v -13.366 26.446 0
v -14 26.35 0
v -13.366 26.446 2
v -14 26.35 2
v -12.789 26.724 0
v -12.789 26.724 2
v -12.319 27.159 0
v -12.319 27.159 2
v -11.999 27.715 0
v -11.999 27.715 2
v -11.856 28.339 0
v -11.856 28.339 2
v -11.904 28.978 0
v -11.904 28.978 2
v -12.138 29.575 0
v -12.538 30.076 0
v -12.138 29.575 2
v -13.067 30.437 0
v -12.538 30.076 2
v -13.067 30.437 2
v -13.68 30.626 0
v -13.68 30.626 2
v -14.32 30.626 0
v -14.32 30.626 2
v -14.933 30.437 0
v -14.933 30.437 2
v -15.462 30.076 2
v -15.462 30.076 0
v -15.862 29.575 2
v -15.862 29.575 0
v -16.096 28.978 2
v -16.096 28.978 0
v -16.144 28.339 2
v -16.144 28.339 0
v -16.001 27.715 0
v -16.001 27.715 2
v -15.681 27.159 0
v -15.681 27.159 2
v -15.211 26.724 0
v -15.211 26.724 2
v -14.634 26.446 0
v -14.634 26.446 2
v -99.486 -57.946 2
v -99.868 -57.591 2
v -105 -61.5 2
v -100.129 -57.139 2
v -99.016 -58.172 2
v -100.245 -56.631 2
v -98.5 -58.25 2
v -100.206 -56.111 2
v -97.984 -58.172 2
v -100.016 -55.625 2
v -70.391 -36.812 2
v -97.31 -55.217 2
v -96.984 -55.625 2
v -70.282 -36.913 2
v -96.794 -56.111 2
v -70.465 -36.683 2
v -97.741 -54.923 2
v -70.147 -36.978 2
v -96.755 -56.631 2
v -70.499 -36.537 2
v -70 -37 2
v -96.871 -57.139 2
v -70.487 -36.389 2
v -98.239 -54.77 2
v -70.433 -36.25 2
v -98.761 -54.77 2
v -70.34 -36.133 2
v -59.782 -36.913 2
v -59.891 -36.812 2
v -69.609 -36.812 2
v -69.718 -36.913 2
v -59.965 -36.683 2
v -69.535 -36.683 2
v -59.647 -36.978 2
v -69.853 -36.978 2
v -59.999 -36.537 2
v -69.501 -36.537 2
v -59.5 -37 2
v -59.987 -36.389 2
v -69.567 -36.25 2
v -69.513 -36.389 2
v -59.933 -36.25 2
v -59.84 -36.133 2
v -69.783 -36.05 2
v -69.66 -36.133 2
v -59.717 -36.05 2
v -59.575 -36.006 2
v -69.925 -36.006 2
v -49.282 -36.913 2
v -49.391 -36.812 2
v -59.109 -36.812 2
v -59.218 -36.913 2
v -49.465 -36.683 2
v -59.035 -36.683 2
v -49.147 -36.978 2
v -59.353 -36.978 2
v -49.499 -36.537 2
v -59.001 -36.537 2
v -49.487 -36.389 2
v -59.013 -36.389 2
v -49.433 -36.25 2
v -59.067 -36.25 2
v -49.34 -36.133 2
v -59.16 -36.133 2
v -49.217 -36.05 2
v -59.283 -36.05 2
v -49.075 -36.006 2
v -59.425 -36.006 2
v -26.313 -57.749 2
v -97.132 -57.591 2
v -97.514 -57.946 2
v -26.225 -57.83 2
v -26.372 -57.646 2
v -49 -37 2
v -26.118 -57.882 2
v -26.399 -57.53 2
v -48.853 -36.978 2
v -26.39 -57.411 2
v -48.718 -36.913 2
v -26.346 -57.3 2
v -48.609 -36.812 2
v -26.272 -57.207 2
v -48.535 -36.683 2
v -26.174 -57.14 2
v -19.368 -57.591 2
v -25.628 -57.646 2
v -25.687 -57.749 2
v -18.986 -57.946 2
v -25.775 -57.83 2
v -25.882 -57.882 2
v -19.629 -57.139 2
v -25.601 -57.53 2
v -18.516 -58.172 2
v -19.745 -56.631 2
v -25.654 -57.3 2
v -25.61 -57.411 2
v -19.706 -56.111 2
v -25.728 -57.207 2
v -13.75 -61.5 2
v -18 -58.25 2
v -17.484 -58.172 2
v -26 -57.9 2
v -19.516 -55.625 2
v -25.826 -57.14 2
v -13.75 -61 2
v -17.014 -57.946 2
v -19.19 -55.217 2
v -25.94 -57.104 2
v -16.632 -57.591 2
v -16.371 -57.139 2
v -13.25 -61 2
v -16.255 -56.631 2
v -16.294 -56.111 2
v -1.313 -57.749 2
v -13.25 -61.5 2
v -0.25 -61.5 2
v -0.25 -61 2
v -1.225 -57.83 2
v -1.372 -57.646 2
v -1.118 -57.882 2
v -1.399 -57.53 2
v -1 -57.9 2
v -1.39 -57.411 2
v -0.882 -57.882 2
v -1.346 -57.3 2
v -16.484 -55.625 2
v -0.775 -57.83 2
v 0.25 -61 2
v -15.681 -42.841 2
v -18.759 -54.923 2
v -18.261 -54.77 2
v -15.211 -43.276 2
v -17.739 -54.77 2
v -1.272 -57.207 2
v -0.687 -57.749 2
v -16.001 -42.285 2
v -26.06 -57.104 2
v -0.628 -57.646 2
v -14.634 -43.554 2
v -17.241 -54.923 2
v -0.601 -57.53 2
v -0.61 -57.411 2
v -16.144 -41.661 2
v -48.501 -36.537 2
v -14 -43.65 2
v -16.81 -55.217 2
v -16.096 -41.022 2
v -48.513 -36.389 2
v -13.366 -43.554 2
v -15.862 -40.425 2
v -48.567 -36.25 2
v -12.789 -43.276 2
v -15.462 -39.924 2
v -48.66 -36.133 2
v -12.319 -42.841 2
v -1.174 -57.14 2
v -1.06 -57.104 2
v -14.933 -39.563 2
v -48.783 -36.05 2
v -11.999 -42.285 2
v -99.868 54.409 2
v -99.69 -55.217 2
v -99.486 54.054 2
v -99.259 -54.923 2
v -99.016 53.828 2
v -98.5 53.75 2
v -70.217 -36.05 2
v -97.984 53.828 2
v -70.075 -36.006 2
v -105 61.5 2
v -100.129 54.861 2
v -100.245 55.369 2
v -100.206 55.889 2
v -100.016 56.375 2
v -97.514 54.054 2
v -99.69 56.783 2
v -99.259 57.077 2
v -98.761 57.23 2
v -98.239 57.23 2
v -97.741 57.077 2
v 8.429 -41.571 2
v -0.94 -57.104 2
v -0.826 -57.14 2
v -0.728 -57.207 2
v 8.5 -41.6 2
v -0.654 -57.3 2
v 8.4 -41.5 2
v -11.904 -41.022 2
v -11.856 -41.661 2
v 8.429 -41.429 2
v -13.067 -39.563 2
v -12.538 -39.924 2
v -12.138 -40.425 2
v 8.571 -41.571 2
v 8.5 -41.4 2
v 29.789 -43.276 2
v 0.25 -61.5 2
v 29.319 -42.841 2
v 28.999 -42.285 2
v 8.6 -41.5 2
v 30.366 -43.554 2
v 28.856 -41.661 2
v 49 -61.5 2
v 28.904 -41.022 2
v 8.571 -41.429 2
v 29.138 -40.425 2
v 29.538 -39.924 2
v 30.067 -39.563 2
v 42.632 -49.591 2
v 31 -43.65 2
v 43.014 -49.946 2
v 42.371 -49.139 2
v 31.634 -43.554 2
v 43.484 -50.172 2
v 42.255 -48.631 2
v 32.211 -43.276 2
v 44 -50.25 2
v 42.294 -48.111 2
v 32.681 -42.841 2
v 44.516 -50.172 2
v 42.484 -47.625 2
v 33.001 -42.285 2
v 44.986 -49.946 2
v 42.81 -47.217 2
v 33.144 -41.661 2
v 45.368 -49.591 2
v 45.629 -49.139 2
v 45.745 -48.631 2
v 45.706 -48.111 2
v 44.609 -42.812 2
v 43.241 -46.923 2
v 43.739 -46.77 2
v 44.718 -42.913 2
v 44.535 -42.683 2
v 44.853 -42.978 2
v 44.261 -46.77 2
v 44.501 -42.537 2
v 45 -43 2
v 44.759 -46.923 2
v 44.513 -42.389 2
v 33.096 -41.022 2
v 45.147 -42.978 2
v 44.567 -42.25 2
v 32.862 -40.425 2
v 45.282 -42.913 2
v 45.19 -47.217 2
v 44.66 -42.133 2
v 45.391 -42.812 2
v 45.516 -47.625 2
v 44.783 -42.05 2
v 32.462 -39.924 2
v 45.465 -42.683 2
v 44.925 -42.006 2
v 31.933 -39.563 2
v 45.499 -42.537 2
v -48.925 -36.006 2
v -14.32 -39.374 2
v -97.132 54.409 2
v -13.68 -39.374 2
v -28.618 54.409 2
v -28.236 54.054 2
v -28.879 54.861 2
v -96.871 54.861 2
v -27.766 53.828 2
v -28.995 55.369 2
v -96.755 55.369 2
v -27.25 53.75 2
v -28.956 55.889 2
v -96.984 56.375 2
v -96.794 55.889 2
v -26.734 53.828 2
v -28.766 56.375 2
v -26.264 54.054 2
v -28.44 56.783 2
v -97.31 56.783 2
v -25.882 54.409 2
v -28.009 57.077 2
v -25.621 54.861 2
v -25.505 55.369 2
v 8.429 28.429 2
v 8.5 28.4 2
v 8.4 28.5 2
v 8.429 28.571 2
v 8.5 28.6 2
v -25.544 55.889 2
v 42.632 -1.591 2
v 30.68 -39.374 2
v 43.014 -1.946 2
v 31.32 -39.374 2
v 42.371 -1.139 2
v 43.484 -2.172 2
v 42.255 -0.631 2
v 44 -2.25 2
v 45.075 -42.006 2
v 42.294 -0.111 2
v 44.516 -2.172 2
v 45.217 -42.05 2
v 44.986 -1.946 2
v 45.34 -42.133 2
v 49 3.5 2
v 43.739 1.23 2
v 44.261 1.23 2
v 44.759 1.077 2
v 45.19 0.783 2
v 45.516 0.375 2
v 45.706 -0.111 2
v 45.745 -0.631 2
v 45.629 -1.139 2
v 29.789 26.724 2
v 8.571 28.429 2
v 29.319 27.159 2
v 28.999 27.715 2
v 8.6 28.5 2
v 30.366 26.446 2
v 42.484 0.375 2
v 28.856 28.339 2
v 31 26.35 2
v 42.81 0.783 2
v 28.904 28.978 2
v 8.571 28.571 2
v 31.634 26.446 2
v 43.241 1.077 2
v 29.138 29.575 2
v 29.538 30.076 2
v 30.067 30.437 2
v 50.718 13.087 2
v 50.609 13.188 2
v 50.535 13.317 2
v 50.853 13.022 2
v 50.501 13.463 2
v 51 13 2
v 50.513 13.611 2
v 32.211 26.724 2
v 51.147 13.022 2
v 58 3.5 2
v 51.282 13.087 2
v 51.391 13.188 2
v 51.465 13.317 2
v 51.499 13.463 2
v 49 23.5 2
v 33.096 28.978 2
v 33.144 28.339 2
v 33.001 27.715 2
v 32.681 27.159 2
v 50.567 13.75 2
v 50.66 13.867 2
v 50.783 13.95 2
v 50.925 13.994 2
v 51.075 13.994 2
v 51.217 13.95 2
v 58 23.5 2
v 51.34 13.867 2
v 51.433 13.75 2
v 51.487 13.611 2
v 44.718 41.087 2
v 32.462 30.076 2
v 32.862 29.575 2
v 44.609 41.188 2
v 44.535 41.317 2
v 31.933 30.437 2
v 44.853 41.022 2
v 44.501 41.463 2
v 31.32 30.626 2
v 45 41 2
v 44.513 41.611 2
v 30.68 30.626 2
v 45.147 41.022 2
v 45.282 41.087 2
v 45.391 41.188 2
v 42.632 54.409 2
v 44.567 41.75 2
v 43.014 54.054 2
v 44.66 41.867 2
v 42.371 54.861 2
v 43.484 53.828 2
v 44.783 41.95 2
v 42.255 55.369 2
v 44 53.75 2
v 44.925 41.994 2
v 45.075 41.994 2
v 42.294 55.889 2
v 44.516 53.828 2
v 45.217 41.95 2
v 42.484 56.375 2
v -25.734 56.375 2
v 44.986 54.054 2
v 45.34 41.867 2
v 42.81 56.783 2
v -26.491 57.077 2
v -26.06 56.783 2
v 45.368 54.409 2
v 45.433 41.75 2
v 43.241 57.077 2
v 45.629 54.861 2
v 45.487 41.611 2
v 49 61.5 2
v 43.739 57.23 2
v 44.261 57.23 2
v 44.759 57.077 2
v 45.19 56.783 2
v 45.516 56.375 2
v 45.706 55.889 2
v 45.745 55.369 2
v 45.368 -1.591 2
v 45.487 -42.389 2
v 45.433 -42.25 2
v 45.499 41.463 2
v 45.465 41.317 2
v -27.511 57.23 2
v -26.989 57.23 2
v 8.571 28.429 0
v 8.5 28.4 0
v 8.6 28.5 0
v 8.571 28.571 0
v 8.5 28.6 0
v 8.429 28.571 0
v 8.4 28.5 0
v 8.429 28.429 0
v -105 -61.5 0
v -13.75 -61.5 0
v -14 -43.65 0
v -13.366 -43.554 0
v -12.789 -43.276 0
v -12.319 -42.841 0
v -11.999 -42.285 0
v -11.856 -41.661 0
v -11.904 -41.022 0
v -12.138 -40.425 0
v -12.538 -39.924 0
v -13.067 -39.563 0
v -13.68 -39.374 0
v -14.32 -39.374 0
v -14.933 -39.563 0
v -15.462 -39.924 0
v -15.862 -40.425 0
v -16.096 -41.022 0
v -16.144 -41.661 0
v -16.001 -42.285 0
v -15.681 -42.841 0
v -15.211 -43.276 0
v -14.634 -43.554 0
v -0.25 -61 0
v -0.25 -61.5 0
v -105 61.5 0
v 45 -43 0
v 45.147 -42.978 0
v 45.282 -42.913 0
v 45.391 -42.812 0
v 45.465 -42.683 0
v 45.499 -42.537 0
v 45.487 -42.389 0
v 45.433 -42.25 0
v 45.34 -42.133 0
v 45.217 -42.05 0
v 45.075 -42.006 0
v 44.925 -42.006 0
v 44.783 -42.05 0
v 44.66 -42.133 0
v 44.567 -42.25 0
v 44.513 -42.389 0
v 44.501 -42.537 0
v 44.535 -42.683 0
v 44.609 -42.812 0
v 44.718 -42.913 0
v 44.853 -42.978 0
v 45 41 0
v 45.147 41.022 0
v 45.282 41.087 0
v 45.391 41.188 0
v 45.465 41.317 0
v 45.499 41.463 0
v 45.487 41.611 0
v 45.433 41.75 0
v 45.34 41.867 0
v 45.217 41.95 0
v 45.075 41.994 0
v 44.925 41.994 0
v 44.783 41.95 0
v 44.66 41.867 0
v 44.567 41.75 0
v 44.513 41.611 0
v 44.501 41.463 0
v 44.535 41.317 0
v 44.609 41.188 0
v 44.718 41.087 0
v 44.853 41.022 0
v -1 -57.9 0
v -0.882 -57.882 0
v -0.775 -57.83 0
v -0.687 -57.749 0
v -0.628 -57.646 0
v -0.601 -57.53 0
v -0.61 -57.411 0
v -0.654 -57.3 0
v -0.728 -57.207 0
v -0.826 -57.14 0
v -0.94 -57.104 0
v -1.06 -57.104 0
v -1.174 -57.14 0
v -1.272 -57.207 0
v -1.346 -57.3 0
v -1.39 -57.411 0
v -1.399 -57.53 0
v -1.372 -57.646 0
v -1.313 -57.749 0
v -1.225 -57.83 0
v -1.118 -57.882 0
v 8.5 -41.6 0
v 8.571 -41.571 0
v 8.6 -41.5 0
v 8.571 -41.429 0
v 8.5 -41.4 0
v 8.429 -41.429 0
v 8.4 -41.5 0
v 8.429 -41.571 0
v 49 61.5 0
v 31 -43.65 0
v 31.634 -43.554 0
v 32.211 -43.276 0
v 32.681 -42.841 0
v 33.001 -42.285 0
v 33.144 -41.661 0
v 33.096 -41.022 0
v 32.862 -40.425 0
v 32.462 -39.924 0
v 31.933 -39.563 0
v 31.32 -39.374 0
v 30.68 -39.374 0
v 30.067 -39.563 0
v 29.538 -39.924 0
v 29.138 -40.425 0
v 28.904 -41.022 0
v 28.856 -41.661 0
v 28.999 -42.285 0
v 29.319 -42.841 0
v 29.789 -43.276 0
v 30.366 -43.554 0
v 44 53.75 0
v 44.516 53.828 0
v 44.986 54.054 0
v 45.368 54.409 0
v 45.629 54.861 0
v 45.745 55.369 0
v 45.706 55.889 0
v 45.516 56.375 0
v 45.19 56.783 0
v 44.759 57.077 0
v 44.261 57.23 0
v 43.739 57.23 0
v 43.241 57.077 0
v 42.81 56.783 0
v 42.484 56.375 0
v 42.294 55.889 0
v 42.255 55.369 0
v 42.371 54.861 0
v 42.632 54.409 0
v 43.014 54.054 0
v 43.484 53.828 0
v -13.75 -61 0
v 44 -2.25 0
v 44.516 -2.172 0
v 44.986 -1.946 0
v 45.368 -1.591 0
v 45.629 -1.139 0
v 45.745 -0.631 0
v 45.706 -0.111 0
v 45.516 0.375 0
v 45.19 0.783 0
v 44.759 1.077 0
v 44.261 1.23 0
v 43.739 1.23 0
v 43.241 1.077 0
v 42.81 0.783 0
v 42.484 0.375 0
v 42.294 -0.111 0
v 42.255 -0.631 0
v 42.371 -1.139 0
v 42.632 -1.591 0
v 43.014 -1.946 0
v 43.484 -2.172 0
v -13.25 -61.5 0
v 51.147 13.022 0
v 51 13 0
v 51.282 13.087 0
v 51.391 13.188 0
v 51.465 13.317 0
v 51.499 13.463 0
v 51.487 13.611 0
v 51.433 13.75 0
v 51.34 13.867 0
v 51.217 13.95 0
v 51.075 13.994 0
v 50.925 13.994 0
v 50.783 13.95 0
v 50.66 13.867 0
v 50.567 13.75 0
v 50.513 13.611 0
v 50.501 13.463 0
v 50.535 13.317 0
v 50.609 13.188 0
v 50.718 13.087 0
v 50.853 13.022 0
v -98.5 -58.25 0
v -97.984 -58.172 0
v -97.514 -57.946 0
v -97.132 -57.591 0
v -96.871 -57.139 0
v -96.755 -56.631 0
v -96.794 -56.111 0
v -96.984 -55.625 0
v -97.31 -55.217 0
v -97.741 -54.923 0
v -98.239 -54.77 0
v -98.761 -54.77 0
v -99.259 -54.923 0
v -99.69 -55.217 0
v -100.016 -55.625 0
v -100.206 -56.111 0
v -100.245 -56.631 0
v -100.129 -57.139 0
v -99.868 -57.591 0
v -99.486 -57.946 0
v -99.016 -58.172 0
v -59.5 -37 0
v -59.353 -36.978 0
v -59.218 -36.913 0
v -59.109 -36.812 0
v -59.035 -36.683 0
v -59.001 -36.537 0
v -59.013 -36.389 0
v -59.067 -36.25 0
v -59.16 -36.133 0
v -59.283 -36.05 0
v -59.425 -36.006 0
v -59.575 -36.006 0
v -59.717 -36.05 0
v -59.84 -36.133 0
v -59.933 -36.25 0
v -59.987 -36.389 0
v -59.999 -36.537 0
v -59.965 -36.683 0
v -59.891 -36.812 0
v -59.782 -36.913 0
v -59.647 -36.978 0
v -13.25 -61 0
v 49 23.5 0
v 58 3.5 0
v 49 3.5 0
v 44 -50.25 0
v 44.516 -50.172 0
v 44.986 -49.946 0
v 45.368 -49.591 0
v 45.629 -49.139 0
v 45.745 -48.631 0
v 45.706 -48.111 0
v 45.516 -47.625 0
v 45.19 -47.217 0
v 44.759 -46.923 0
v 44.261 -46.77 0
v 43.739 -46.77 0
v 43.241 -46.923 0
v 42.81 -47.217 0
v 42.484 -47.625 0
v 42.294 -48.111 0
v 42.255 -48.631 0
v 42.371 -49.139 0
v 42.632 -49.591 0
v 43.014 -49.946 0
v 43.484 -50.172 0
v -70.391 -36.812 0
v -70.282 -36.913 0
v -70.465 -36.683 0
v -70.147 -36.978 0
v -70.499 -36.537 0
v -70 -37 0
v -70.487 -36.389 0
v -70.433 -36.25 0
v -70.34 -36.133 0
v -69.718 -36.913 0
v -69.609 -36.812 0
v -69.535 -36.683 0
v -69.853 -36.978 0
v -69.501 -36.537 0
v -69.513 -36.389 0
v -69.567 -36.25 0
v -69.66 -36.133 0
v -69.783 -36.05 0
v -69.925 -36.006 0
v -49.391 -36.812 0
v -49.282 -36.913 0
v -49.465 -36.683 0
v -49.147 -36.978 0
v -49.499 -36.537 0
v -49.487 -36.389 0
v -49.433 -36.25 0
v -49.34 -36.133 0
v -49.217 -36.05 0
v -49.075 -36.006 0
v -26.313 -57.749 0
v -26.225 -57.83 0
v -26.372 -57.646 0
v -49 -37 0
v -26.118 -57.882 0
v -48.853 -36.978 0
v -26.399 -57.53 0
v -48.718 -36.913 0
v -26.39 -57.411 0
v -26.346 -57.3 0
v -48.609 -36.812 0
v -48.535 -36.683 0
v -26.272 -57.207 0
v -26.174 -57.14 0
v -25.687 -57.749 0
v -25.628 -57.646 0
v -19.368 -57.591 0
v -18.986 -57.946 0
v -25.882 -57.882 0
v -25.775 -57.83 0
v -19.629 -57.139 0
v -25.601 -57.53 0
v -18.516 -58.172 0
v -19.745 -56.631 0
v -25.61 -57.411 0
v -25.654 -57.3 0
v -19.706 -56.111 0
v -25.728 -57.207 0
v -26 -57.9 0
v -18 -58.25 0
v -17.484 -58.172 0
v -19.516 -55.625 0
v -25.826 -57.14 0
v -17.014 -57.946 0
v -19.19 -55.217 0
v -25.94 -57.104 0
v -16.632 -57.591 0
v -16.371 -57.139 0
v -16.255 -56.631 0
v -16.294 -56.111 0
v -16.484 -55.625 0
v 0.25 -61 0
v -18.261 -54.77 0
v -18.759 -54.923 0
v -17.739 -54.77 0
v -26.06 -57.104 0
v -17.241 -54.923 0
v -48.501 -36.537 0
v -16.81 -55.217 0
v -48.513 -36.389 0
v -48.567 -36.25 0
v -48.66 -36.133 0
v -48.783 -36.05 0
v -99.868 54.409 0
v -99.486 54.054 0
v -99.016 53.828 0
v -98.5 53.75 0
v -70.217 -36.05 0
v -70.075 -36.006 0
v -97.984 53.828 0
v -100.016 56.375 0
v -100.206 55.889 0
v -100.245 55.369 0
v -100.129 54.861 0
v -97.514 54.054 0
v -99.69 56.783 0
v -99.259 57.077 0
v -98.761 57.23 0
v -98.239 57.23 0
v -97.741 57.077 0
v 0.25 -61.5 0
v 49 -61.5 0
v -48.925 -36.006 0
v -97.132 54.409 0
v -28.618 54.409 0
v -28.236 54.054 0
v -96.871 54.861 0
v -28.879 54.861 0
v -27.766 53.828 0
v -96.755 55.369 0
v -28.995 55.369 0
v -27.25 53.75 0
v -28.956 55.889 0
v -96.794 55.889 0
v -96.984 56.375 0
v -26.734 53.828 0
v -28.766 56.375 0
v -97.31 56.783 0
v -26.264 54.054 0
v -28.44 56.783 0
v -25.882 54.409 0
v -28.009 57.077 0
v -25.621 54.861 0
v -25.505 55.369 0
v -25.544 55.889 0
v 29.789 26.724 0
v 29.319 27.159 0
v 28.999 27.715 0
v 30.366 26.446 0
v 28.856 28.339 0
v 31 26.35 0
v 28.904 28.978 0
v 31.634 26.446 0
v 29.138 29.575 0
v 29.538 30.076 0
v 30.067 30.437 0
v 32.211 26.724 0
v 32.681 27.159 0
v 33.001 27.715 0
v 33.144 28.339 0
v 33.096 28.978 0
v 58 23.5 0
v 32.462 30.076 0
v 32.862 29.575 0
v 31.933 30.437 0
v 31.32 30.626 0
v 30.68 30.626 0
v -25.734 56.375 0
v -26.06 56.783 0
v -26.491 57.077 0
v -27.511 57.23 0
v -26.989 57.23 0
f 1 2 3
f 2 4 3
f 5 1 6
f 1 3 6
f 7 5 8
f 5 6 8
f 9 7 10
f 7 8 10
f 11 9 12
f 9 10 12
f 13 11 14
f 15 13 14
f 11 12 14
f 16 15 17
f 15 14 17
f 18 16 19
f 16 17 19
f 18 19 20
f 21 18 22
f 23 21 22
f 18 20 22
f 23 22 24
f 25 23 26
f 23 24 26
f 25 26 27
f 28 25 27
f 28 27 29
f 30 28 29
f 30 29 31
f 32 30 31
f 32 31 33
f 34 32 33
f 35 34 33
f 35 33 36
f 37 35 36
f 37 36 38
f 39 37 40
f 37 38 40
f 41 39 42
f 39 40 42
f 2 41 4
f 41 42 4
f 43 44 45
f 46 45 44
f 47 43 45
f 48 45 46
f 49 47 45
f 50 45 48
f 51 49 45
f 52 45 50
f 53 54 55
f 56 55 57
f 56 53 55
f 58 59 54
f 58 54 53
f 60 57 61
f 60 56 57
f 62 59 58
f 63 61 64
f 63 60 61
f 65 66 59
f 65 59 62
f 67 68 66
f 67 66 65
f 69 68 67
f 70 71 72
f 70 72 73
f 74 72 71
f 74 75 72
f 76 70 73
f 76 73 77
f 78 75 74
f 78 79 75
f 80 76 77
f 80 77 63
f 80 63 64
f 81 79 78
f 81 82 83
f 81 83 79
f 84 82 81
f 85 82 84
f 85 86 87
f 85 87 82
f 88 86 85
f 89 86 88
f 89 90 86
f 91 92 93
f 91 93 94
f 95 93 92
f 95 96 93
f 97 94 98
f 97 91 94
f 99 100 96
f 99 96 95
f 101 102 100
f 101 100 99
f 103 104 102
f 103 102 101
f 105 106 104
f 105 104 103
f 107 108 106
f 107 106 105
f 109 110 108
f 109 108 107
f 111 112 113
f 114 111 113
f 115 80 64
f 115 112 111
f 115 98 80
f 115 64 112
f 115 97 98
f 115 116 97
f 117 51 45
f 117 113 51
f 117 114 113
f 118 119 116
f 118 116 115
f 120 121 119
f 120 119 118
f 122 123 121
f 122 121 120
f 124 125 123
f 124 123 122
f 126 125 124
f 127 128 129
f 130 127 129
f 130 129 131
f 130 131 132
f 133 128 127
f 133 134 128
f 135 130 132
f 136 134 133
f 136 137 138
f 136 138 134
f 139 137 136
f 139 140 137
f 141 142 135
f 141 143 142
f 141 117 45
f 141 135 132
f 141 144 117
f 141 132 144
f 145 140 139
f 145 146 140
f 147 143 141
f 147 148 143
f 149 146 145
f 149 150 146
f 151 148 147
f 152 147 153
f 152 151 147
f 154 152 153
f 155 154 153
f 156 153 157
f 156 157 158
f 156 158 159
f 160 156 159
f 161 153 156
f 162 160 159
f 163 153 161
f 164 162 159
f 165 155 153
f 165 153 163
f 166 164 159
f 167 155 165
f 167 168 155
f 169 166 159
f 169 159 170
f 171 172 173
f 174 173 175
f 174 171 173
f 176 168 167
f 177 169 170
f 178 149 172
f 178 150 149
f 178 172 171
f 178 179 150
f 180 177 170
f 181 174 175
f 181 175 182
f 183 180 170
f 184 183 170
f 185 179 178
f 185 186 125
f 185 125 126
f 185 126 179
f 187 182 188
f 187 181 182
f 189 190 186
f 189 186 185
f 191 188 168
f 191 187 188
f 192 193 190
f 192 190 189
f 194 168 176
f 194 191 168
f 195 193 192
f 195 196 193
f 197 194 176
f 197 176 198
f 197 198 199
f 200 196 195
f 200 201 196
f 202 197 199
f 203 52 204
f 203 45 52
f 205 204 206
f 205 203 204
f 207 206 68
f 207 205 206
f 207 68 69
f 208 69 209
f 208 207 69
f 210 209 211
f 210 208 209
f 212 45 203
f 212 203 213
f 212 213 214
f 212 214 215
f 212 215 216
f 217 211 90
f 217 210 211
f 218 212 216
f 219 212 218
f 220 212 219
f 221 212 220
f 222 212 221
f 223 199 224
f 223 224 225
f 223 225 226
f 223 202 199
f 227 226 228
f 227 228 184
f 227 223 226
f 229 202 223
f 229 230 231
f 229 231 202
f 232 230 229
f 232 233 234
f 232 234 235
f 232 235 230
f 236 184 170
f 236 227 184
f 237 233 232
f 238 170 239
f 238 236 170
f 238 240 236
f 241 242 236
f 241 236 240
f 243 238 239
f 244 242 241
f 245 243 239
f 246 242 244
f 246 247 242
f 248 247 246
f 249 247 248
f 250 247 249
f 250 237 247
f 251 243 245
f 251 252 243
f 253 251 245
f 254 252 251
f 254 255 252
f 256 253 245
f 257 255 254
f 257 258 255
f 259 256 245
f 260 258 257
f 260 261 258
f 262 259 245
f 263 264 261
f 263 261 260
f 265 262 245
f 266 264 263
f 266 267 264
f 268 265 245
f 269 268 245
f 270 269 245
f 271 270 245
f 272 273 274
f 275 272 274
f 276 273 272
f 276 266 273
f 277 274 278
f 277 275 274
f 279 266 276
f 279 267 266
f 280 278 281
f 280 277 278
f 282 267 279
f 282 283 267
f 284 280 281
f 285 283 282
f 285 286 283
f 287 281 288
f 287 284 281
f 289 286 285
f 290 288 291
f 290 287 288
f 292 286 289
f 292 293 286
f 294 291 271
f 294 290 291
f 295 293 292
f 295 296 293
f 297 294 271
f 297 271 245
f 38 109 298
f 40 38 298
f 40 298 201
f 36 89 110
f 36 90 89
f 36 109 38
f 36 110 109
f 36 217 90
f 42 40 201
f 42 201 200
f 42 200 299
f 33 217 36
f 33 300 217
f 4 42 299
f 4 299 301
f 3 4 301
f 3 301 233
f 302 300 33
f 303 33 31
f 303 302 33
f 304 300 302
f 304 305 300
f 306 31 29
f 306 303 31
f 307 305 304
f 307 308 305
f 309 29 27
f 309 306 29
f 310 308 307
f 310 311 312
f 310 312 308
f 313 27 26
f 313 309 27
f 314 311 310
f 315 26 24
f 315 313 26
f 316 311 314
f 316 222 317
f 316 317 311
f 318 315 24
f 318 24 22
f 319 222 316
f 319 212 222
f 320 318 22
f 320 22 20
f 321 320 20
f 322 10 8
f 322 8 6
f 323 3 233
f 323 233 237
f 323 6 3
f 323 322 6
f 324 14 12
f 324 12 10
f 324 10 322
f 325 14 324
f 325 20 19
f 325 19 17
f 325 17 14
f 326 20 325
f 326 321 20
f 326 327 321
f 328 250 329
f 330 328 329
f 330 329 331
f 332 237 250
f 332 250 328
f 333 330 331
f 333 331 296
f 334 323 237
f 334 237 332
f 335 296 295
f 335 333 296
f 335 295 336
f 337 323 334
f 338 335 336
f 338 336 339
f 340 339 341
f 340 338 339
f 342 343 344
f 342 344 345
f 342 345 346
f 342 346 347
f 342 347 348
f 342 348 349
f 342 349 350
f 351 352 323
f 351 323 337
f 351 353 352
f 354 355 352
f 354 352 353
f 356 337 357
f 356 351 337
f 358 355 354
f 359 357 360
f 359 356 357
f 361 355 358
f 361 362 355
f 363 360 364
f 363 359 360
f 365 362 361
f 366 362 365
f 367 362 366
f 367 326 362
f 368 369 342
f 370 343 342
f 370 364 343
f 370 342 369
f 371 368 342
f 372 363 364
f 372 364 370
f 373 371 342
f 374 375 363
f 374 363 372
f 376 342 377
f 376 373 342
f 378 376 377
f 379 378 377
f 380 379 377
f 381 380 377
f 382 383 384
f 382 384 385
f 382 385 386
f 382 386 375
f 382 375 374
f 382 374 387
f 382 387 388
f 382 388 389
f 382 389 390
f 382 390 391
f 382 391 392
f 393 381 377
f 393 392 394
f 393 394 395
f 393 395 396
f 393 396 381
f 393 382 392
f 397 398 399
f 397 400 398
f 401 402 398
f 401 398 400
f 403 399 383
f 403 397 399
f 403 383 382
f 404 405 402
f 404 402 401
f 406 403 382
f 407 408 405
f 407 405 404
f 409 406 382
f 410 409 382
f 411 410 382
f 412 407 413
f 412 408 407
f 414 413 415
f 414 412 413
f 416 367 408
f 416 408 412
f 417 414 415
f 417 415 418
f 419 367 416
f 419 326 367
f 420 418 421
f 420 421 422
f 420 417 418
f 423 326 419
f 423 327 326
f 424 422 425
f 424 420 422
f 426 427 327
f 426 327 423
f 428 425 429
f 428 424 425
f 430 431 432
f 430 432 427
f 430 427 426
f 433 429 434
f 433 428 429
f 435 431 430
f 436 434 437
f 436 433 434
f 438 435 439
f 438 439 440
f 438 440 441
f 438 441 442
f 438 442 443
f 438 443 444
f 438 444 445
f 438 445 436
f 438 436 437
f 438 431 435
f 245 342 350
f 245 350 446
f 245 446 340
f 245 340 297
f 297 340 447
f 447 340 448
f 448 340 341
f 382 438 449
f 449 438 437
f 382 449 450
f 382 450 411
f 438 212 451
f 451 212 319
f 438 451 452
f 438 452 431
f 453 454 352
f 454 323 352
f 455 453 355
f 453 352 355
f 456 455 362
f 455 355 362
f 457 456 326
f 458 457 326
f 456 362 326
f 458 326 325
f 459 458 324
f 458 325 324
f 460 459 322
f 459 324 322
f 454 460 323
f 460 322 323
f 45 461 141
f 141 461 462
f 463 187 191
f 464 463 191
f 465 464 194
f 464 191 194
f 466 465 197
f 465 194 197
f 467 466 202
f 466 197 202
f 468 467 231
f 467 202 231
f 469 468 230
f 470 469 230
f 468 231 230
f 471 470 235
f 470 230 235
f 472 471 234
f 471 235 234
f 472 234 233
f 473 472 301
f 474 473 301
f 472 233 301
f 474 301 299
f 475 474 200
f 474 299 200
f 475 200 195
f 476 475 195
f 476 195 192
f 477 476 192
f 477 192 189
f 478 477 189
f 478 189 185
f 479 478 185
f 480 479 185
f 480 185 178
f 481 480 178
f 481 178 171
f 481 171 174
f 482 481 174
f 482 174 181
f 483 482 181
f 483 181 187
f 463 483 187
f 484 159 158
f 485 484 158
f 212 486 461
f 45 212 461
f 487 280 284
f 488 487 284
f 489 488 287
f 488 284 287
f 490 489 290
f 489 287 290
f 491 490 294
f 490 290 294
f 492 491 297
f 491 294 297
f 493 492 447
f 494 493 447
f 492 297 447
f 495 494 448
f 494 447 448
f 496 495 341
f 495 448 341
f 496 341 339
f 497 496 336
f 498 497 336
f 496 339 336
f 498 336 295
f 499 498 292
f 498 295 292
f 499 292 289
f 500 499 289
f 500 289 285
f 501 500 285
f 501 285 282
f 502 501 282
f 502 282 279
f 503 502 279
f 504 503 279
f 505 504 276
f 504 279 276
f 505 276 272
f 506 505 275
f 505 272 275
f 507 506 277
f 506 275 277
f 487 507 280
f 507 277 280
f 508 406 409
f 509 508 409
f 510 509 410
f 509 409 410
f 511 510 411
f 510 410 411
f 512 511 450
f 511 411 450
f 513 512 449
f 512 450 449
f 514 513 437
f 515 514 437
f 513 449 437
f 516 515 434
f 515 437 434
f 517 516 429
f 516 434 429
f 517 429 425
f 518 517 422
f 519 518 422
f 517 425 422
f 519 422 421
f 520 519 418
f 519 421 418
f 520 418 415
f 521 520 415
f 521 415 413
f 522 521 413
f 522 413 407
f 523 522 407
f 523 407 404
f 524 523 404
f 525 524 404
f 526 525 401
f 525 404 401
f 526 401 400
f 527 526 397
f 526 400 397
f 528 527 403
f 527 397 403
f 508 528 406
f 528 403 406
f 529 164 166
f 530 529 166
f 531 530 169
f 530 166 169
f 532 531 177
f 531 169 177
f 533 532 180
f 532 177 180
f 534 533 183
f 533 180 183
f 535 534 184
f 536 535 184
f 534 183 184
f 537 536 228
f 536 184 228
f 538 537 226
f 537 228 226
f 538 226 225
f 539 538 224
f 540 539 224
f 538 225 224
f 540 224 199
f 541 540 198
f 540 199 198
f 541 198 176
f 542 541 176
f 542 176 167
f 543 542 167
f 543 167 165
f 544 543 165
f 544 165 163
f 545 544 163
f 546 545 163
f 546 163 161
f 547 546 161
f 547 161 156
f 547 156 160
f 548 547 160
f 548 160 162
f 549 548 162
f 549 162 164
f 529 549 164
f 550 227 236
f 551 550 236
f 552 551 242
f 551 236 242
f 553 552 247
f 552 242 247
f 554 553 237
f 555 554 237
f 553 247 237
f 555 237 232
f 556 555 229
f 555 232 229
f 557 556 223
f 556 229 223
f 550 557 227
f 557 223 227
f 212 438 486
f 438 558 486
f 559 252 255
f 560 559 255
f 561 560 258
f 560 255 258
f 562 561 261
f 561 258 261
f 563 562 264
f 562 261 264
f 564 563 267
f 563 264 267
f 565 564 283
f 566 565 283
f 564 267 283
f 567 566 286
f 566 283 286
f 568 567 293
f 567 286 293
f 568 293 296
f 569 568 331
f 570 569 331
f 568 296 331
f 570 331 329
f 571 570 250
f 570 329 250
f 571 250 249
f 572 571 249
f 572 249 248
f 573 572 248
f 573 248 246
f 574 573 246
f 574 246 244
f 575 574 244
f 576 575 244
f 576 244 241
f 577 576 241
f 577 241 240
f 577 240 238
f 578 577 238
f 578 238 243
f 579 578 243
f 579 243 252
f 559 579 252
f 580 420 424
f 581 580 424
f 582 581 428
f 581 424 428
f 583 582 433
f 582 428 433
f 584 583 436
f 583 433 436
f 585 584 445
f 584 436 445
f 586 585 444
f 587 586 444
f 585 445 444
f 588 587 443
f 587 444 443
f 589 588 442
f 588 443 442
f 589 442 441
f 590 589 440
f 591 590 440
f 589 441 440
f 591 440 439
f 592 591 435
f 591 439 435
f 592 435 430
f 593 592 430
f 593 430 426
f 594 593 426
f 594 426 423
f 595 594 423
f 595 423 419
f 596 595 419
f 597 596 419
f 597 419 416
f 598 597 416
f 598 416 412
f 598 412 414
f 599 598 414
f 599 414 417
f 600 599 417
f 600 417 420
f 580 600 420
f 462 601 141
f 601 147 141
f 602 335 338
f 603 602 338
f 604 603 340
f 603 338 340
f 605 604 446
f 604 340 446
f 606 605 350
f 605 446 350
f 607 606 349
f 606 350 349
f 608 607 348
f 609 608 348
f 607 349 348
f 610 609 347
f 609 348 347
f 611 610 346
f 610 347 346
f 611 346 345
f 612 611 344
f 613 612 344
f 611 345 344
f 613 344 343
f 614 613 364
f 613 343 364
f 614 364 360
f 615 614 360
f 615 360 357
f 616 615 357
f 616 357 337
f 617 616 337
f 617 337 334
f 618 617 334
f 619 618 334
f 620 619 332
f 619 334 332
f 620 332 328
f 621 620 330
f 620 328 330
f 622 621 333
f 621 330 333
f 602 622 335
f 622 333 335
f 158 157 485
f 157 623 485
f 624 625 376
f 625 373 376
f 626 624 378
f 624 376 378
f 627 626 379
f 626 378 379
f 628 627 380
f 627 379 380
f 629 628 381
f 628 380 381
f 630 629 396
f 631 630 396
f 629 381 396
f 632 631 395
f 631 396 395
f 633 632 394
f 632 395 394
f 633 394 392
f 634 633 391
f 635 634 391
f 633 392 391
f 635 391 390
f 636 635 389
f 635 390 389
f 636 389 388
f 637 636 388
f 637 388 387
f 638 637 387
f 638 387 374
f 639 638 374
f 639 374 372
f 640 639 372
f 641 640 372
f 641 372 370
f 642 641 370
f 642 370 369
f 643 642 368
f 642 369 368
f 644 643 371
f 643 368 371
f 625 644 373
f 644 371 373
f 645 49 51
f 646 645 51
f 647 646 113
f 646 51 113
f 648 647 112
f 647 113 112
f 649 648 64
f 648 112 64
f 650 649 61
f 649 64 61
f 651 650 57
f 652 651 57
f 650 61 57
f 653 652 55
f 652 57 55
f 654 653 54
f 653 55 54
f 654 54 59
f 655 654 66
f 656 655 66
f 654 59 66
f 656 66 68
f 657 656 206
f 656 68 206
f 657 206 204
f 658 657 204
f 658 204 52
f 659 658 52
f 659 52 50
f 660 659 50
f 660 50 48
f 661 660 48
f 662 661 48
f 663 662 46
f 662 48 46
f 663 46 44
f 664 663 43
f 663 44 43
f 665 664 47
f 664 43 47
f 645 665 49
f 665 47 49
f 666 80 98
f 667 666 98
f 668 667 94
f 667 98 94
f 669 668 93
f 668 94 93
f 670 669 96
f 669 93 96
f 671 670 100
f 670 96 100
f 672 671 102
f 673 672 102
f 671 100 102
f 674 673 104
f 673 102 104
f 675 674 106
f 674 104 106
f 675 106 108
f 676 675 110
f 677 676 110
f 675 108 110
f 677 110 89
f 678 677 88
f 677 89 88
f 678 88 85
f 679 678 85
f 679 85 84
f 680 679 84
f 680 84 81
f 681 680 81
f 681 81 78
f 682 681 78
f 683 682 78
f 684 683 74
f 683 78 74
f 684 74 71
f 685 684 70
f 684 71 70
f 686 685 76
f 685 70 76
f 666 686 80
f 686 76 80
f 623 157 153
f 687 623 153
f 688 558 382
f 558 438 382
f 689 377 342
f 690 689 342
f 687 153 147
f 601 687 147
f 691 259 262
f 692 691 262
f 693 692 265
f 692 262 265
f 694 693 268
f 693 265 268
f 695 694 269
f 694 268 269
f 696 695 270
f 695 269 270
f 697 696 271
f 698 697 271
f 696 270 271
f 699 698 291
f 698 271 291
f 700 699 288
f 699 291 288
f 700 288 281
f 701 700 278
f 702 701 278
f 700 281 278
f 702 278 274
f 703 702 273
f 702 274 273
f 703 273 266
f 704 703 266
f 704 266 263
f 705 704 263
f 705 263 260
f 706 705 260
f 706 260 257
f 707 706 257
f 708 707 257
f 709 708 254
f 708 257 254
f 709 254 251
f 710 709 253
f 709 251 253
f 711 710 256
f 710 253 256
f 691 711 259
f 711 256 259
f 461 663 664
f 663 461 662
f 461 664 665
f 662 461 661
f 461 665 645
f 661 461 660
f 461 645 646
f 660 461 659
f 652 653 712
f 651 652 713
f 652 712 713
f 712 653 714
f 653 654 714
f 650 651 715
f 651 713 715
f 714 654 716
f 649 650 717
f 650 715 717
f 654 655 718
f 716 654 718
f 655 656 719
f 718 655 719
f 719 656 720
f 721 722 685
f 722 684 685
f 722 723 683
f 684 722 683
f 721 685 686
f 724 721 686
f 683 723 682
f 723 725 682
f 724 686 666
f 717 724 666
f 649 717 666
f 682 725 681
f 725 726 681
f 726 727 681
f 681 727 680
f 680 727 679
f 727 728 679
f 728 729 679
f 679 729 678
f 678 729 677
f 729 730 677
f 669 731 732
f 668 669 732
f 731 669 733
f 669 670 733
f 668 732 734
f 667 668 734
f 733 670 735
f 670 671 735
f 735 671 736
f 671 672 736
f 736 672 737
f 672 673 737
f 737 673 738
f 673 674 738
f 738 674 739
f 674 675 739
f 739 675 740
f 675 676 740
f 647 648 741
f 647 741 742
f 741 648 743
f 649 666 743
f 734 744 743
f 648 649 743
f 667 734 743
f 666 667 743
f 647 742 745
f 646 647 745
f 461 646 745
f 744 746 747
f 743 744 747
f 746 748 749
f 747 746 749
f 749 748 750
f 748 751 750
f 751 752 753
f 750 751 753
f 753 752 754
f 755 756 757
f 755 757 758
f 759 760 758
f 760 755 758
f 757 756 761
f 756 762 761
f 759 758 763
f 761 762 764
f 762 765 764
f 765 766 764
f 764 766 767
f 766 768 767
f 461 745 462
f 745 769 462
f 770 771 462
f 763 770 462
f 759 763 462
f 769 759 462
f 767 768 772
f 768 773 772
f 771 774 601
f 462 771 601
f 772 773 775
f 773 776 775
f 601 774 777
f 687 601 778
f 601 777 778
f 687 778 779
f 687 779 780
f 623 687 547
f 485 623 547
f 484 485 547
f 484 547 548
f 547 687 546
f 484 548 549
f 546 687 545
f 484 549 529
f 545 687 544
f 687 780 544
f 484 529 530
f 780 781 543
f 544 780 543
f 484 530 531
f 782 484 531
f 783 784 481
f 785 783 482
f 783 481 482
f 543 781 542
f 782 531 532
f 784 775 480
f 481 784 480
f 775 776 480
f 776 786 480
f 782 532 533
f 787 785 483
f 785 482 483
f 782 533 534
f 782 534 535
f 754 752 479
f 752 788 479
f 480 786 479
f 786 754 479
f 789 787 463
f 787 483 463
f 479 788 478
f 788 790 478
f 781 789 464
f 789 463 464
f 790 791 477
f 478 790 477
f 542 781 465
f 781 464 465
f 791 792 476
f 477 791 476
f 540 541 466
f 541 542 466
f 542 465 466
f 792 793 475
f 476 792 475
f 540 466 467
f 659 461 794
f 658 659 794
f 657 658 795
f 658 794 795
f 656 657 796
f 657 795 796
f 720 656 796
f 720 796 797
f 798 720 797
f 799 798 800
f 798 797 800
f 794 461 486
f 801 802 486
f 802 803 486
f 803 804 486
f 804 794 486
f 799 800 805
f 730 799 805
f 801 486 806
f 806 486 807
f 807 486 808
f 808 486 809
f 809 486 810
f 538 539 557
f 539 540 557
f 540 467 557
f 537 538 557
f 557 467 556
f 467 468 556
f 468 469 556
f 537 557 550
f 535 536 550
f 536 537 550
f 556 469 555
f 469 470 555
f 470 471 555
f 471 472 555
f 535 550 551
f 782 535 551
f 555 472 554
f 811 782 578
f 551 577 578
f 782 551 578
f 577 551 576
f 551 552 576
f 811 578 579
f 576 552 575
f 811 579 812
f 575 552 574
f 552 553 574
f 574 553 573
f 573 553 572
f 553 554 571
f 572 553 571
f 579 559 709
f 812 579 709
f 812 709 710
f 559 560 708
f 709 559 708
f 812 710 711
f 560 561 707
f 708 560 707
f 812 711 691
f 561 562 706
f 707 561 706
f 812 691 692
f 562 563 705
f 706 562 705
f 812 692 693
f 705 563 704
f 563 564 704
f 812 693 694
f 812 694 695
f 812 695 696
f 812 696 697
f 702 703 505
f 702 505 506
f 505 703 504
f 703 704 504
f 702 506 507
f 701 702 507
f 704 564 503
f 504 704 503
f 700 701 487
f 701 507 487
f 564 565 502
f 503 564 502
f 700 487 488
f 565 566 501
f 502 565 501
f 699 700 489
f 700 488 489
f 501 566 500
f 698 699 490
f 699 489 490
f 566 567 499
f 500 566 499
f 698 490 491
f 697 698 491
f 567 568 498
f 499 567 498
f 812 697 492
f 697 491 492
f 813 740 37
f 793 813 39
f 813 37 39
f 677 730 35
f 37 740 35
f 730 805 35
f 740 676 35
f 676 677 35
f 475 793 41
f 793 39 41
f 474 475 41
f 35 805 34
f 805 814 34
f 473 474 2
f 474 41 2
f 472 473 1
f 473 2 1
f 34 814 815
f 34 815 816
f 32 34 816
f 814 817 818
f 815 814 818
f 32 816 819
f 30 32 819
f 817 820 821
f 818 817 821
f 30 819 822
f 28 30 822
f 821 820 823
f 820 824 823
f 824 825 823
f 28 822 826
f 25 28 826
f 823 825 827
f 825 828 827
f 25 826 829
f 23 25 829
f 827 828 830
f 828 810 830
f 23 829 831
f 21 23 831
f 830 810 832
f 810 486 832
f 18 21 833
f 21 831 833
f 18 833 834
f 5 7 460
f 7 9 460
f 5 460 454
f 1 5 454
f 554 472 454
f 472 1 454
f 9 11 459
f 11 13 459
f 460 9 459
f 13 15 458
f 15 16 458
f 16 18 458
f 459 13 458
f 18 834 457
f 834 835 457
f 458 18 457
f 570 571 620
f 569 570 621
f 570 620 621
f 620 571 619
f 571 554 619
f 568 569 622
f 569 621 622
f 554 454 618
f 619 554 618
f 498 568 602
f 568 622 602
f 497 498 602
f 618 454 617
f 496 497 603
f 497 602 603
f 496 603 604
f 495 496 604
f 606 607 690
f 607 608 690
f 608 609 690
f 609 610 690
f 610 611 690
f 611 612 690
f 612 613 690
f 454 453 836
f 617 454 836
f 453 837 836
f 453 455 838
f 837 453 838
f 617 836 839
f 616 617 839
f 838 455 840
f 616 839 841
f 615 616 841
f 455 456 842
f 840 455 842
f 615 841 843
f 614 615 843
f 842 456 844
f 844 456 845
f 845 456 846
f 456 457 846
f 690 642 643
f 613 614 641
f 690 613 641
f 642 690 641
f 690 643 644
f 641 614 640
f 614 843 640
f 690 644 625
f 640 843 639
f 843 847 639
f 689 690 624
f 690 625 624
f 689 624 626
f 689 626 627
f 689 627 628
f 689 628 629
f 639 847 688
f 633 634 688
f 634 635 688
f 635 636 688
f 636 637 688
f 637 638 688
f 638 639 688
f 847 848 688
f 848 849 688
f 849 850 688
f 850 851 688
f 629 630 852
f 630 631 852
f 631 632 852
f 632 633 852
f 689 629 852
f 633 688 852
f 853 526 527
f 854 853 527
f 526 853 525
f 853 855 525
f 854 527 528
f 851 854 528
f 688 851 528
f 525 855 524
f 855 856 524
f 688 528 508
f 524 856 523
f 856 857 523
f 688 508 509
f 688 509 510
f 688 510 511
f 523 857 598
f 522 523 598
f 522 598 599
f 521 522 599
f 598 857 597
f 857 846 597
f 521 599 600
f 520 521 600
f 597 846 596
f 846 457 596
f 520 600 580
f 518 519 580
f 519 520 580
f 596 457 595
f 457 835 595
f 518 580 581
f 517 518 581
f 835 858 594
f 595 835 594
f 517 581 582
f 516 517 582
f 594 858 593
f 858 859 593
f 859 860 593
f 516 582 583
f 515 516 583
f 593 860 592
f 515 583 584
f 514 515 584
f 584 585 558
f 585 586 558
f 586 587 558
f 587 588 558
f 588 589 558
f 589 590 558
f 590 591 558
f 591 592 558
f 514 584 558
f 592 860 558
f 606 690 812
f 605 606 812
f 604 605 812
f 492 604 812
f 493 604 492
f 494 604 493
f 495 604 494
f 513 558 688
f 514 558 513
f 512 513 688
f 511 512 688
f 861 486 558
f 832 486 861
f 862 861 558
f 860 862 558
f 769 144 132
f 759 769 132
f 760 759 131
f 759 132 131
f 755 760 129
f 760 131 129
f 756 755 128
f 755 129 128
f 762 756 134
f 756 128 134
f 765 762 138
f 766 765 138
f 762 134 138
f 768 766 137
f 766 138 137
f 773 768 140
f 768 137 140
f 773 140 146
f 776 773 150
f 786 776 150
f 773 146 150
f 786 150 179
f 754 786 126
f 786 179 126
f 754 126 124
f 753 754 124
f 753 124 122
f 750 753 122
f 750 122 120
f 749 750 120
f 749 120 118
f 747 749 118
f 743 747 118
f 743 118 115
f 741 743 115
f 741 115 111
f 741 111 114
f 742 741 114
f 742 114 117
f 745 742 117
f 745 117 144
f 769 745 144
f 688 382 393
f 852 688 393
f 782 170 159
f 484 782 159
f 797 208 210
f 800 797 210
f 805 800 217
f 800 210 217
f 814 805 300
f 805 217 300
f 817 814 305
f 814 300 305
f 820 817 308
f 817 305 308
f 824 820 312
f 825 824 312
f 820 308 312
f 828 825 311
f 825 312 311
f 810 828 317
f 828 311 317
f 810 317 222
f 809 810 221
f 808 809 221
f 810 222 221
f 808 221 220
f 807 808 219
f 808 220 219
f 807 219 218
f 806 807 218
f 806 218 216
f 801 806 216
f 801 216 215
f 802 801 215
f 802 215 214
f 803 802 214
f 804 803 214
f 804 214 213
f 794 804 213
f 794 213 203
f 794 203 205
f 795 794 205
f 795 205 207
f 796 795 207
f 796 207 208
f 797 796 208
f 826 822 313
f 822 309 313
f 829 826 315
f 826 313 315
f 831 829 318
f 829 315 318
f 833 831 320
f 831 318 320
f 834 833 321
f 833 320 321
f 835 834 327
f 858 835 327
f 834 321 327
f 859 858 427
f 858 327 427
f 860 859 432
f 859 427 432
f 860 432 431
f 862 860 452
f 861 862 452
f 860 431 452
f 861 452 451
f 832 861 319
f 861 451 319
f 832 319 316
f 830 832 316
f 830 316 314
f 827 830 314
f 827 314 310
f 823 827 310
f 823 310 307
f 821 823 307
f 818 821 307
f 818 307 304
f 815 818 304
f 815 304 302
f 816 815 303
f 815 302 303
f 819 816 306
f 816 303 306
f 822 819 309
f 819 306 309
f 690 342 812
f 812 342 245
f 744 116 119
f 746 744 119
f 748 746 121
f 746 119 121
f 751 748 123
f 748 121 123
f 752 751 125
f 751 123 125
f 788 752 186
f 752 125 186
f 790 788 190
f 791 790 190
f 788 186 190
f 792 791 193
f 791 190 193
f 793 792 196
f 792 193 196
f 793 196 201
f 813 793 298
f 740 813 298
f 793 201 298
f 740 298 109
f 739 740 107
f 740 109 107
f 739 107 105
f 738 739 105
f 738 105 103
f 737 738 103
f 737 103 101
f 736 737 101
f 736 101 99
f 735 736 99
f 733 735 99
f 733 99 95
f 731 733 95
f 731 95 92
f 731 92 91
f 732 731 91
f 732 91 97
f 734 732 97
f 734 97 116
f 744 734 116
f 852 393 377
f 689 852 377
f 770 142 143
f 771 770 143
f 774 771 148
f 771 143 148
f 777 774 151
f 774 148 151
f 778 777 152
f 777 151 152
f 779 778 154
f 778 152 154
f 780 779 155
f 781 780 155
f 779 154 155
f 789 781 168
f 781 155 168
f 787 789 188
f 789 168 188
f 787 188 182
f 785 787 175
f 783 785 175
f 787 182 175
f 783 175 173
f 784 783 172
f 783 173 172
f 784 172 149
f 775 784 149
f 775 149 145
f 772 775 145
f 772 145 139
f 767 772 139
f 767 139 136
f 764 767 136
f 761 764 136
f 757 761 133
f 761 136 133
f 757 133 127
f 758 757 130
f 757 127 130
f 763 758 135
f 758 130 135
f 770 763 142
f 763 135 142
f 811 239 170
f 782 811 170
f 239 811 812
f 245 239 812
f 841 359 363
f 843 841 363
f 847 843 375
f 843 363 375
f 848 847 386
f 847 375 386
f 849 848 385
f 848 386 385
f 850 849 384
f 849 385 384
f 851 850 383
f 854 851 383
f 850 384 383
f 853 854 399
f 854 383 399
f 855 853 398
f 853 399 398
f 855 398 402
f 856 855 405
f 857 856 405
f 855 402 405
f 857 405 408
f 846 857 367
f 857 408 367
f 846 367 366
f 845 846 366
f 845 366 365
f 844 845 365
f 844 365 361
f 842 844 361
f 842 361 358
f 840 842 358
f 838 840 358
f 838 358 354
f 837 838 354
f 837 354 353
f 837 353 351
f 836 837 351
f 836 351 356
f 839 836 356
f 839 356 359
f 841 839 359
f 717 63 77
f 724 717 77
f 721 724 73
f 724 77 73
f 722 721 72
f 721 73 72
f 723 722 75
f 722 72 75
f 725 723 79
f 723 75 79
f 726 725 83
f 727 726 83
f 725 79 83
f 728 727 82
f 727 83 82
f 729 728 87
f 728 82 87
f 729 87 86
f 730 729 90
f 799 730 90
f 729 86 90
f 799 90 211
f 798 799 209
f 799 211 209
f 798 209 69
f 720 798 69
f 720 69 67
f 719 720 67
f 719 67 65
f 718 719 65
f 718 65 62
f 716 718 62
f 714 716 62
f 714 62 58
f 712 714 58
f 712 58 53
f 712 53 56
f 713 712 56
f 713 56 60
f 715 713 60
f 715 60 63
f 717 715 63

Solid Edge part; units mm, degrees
sketch "Sketch1" plane through (0, 0, 0) normal (0, 0, 1) x (1, 0, 0)
  line L0 (-105, -61.5) -> (105, -61.5)
  line L1 (105, -61.5) -> (105, 61.5)
  line L2 (105, 61.5) -> (-105, 61.5)
  line L3 (-105, 61.5) -> (-105, -61.5)
  dimension "D1" = 123
  dimension "D2" = 210
extrude "Protrusion1" add sketch "Sketch1" along normal blind 2
hole "Hole1" at (-1, -57.5, 2) direction (0, 0, -1) diameter 0.8 end through all
hole "Hole2" at (-26, -57.5, 2) direction (0, 0, -1) diameter 0.8 end through all
sketch "Sketch2" plane through (0, 0, 2) normal (0, 0, 1) x (-1, 0, 0)
  line L0 (-0.25, 61) -> (0.25, 61)
  line L1 (0.25, 61) -> (0.25, 61.5)
  line L2 (0.25, 61.5) -> (-0.25, 61.5)
  line L3 (-0.25, 61.5) -> (-0.25, 61)
  dimension "D1" = 0.5
extrude "Cutout1" cut sketch "Sketch2" against normal through all
sketch "Sketch3" plane through (0, 0, 2) normal (0, 0, 1) x (1, 0, 0)
  line L0 (105, -61.5) -> (105, 61.5)
  line L1 (49, -61.5) -> (105, -61.5)
  line L2 (49, 3.5) -> (49, -61.5)
  line L3 (58, 3.5) -> (49, 3.5)
  line L4 (58, 23.5) -> (58, 3.5)
  line L5 (49, 23.5) -> (58, 23.5)
  line L6 (49, 61.5) -> (49, 23.5)
  line L7 (105, 61.5) -> (49, 61.5)
  dimension "D1" = 154
  dimension "D2" = 20
  dimension "D3" = 38
  dimension "D4" = 9
extrude "Ausschnitt_3" cut sketch "Sketch3" against normal blind 2
hole "Hole3" at (-98.5, 55.5, 2) direction (0, 0, -1) diameter 3.5 end through all
hole "Hole4" at (44, 55.5, 2) direction (0, 0, -1) diameter 3.5 end through all
hole "Hole5" at (44, -48.5, 2) direction (0, 0, -1) diameter 3.5 end through all
hole "Hole6" at (-18, -56.5, 2) direction (0, 0, -1) diameter 3.5 end through all
hole "Hole7" at (-98.5, -56.5, 2) direction (0, 0, -1) diameter 3.5 end through all
hole "Hole8" at (44, -0.5, 2) direction (0, 0, -1) diameter 3.5 end through all
hole "Hole9" at (-27.25, 55.5, 2) direction (0, 0, -1) diameter 3.5 end through all
hole "Hole10" at (45, -42.5, 2) direction (0, 0, -1) diameter 1 end through all
hole "Hole11" at (45, 41.5, 2) direction (0, 0, -1) diameter 1 end through all
hole "Hole12" at (51, 13.5, 2) direction (0, 0, -1) diameter 1 end through all
hole "Hole13" at (-59.5, -36.5, 2) direction (0, 0, -1) diameter 1 end through all
hole "Hole14" at (-49, -36.5, 2) direction (0, 0, -1) diameter 1 end through all
hole "Hole15" at (-70, -36.5, 2) direction (0, 0, -1) diameter 1 end through all
hole "Hole16" at (31, 28.5, 2) direction (0, 0, -1) diameter 4.3 end up to next
hole "Hole17" at (31, -41.5, 2) direction (0, 0, -1) diameter 4.3 end up to next
hole "Hole18" at (-14, -41.5, 2) direction (0, 0, -1) diameter 4.3 end up to next
hole "Hole19" at (-14, 28.5, 2) direction (0, 0, -1) diameter 4.3 end up to next
hole "Hole20" at (8.5, -41.5, 2) direction (0, 0, -1) diameter 0.2 end through all
hole "Hole21" at (8.5, 28.5, 2) direction (0, 0, -1) diameter 0.2 end through all
sketch "Sketch4" plane through (-23.4888, 0, 2) normal (0, 0, 1) x (1, 0, 0)
  line L0 (9.7388, -61.5) -> (10.2388, -61.5)
  line L1 (10.2388, -61.5) -> (10.2388, -61)
  line L2 (10.2388, -61) -> (9.7388, -61)
  line L3 (9.7388, -61) -> (9.7388, -61.5)
  dimension "D1" = 0.5
extrude "Cutout2" cut sketch "Sketch4" against normal through all
